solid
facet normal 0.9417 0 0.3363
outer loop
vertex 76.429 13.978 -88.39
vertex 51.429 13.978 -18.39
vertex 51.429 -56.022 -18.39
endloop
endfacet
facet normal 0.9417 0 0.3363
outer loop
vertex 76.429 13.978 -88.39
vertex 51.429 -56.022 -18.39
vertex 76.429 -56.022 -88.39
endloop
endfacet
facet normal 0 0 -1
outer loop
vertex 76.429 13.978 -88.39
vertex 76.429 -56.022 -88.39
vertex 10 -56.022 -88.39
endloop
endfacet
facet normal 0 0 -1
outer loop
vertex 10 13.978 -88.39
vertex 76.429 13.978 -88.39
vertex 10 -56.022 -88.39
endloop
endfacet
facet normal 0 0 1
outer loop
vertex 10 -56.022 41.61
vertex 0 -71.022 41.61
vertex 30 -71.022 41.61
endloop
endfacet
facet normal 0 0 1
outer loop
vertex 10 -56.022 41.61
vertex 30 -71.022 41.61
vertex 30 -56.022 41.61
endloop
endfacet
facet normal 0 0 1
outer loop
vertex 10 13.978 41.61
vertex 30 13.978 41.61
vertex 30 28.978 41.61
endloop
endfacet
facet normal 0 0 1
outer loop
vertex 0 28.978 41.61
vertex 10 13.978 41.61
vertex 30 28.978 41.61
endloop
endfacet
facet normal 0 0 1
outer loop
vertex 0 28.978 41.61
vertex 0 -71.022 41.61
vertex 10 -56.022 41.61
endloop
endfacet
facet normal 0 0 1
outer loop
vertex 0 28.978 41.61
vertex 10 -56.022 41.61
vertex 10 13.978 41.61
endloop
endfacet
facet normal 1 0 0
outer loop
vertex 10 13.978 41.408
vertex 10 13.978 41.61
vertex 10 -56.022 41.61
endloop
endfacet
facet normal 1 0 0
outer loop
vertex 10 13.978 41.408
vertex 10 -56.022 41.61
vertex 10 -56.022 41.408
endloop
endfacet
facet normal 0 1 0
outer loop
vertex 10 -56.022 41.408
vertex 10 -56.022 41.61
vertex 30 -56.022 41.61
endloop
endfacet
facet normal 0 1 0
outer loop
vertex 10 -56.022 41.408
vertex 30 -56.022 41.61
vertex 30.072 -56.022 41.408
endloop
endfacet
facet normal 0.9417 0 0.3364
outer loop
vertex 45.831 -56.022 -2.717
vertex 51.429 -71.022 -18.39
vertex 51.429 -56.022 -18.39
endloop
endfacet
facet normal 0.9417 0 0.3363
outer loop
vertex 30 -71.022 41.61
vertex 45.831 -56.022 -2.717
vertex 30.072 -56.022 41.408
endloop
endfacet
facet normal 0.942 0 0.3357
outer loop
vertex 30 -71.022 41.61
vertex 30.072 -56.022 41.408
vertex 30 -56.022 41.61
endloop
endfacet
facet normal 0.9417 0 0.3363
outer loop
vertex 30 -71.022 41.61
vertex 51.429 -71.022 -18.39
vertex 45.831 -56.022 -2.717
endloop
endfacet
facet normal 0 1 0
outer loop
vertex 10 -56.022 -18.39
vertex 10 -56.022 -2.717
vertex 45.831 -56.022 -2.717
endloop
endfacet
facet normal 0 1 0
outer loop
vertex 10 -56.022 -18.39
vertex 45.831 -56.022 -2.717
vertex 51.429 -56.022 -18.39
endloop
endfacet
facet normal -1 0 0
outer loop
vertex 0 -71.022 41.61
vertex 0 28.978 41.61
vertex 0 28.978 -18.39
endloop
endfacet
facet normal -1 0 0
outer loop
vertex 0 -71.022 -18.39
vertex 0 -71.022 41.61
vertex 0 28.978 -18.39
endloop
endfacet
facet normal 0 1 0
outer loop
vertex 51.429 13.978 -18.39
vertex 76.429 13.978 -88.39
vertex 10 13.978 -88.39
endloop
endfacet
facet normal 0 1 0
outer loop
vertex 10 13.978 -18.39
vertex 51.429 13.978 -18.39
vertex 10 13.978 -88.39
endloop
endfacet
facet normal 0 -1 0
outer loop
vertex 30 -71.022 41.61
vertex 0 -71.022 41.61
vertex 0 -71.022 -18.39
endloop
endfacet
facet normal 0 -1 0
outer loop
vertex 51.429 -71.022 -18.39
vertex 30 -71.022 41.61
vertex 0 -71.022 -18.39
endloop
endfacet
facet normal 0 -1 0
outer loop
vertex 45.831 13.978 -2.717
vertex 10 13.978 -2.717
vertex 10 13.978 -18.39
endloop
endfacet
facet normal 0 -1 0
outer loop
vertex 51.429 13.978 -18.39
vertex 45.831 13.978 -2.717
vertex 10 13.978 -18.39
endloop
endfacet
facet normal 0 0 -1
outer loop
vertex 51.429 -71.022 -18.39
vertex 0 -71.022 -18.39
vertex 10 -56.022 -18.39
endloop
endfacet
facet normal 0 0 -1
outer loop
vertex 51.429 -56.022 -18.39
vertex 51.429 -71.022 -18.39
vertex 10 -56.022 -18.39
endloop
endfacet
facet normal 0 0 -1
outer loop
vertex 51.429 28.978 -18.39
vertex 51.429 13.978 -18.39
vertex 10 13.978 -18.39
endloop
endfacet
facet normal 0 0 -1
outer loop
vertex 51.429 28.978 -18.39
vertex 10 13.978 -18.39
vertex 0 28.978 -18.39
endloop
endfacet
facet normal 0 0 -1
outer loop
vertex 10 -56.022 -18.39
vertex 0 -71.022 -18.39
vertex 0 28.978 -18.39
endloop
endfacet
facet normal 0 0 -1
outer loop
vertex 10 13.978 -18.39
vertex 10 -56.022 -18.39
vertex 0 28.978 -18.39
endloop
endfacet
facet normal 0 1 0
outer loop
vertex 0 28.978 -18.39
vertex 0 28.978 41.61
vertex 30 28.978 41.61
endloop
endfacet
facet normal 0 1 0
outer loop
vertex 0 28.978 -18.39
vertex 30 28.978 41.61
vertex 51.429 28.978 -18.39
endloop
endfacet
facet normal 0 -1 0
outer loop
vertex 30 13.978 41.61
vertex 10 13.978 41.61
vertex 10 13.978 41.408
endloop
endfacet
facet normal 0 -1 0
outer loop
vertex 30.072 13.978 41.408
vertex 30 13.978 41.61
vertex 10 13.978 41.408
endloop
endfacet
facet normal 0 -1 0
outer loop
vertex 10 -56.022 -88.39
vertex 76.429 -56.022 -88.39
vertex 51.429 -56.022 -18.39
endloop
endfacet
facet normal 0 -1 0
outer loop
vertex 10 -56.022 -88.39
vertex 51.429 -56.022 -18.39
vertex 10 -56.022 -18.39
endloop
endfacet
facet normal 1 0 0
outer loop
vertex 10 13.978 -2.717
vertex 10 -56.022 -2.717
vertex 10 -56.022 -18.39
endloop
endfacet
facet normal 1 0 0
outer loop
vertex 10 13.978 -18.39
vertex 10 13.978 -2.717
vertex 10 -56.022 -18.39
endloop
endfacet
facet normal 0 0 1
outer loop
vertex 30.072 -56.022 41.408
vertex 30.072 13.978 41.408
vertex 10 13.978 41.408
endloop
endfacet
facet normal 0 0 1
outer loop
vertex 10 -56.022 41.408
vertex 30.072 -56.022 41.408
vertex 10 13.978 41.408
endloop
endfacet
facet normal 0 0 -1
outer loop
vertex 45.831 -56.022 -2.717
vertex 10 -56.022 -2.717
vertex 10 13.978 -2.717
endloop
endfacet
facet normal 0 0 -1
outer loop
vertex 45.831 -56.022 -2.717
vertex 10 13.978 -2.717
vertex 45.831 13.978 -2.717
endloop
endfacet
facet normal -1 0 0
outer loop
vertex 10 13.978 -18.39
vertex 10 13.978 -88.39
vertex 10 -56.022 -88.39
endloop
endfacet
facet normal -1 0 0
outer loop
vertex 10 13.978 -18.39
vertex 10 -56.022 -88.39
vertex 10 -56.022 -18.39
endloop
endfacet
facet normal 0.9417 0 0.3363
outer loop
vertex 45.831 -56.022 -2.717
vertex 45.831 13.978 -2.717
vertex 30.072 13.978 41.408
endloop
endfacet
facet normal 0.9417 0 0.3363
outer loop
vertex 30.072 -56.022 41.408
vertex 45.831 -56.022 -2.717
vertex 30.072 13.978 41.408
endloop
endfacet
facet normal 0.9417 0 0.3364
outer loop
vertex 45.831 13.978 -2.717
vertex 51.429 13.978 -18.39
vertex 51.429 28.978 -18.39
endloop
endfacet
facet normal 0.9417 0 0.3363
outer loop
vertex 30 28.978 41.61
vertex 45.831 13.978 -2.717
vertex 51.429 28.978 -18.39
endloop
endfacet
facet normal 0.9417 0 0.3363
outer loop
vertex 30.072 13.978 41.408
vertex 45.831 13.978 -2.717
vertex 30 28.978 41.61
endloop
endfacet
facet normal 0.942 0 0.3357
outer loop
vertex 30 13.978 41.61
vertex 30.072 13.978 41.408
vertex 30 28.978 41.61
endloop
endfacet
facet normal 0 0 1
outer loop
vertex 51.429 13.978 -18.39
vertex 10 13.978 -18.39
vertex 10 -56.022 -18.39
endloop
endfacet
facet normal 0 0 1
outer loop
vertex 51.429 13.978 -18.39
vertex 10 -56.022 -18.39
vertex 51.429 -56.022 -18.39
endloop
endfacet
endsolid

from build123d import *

# Parameters (mm, degrees)
ESBO_O1_W                  = 60
ESBO_O1_H                  = 100
RESSALTO_EXTRUS_O1_DEPTH   = 10
ESBO_O2_W                  = 60
ESBO_O2_H                  = 15
RESSALTO_EXTRUS_O2_DEPTH   = 70
RESSALTO_EXTRUS_O2_2_DEPTH = 70
CORTE_EXTRUS_O3_DEPTH      = 121
RESSALTO_EXTRUS_O4_DEPTH   = 70
RESSALTO_EXTRUS_O5_DEPTH   = 70


with BuildPart() as part:
    # Esboço1 → Ressalto-extrusão1 (new body)
    with BuildSketch(Plane(origin=(0, 0, 0), x_dir=(0, 0, -1), z_dir=(1, 0, 0))):
        with Locations((-11.609907121, -21.021671827)):
            Rectangle(ESBO_O1_W, ESBO_O1_H)
    extrude(amount=RESSALTO_EXTRUS_O1_DEPTH)



with BuildPart() as body_2:
    # Esboço2 → Ressalto-extrusão2 (new body)
    with BuildSketch(Plane(origin=(10, 0, 0), x_dir=(0, 0, -1), z_dir=(1, 0, 0))):
        with Locations((-11.609907121, 21.478328173)):
            Rectangle(ESBO_O2_W, ESBO_O2_H)
    extrude(amount=RESSALTO_EXTRUS_O2_DEPTH)


with BuildPart() as body_3:
    # Esboço2 → Ressalto-extrus_o2 2 (new body)
    with BuildSketch(Plane(origin=(10, 0, 0), x_dir=(0, 0, -1), z_dir=(1, 0, 0))):
        with Locations((-11.609907121, -63.521671827)):
            Rectangle(ESBO_O2_W, ESBO_O2_H)
    extrude(amount=RESSALTO_EXTRUS_O2_2_DEPTH)


with BuildPart() as corte_extrus_o3_tool:
    # Esboço3 → Corte-extrusão3 (new body)
    with BuildSketch(Plane.XZ.offset(71.021671827)):
        Polygon((30, 41.609907121), (80, 41.609907121), (80, -98.390092879), align=None)
    extrude(amount=-CORTE_EXTRUS_O3_DEPTH)


with BuildPart() as body_2_1:
    add(body_2.part)

    # Corte-extrusão3: cut by corte_extrus_o3_tool
    add(corte_extrus_o3_tool.part, mode=Mode.SUBTRACT)


with BuildPart() as body_3_1:
    add(body_3.part)

    # Corte-extrusão3: cut by corte_extrus_o3_tool
    add(corte_extrus_o3_tool.part, mode=Mode.SUBTRACT)


with BuildPart() as part_1:
    add(part.part)

    add(body_2_1.part)  # Ressalto-extrusão4 merges body 2

    add(body_3_1.part)  # Ressalto-extrusão4 merges body 3
    # Esboço7 → Ressalto-extrusão4 (add)
    with BuildSketch(Plane.XZ.offset(-13.978328173)):
        Polygon((30.072142547, 41.407907988), (10, 41.407907988), (10, -2.717102769), (40, -2.717102769), (45.831074961, -2.717102769), align=None)
    extrude(amount=RESSALTO_EXTRUS_O4_DEPTH)


with BuildPart() as body_2_2:
    # Esboço9 → Ressalto-extrusão5 (new body)
    with BuildSketch(Plane.XZ.offset(-13.978328173)):
        Polygon((51.428571429, -18.390092879), (76.428571429, -88.390092879), (10, -88.390092879), (10, -18.390092879), align=None)
    extrude(amount=RESSALTO_EXTRUS_O5_DEPTH)


solid = Compound([part_1.part, body_2_2.part])
